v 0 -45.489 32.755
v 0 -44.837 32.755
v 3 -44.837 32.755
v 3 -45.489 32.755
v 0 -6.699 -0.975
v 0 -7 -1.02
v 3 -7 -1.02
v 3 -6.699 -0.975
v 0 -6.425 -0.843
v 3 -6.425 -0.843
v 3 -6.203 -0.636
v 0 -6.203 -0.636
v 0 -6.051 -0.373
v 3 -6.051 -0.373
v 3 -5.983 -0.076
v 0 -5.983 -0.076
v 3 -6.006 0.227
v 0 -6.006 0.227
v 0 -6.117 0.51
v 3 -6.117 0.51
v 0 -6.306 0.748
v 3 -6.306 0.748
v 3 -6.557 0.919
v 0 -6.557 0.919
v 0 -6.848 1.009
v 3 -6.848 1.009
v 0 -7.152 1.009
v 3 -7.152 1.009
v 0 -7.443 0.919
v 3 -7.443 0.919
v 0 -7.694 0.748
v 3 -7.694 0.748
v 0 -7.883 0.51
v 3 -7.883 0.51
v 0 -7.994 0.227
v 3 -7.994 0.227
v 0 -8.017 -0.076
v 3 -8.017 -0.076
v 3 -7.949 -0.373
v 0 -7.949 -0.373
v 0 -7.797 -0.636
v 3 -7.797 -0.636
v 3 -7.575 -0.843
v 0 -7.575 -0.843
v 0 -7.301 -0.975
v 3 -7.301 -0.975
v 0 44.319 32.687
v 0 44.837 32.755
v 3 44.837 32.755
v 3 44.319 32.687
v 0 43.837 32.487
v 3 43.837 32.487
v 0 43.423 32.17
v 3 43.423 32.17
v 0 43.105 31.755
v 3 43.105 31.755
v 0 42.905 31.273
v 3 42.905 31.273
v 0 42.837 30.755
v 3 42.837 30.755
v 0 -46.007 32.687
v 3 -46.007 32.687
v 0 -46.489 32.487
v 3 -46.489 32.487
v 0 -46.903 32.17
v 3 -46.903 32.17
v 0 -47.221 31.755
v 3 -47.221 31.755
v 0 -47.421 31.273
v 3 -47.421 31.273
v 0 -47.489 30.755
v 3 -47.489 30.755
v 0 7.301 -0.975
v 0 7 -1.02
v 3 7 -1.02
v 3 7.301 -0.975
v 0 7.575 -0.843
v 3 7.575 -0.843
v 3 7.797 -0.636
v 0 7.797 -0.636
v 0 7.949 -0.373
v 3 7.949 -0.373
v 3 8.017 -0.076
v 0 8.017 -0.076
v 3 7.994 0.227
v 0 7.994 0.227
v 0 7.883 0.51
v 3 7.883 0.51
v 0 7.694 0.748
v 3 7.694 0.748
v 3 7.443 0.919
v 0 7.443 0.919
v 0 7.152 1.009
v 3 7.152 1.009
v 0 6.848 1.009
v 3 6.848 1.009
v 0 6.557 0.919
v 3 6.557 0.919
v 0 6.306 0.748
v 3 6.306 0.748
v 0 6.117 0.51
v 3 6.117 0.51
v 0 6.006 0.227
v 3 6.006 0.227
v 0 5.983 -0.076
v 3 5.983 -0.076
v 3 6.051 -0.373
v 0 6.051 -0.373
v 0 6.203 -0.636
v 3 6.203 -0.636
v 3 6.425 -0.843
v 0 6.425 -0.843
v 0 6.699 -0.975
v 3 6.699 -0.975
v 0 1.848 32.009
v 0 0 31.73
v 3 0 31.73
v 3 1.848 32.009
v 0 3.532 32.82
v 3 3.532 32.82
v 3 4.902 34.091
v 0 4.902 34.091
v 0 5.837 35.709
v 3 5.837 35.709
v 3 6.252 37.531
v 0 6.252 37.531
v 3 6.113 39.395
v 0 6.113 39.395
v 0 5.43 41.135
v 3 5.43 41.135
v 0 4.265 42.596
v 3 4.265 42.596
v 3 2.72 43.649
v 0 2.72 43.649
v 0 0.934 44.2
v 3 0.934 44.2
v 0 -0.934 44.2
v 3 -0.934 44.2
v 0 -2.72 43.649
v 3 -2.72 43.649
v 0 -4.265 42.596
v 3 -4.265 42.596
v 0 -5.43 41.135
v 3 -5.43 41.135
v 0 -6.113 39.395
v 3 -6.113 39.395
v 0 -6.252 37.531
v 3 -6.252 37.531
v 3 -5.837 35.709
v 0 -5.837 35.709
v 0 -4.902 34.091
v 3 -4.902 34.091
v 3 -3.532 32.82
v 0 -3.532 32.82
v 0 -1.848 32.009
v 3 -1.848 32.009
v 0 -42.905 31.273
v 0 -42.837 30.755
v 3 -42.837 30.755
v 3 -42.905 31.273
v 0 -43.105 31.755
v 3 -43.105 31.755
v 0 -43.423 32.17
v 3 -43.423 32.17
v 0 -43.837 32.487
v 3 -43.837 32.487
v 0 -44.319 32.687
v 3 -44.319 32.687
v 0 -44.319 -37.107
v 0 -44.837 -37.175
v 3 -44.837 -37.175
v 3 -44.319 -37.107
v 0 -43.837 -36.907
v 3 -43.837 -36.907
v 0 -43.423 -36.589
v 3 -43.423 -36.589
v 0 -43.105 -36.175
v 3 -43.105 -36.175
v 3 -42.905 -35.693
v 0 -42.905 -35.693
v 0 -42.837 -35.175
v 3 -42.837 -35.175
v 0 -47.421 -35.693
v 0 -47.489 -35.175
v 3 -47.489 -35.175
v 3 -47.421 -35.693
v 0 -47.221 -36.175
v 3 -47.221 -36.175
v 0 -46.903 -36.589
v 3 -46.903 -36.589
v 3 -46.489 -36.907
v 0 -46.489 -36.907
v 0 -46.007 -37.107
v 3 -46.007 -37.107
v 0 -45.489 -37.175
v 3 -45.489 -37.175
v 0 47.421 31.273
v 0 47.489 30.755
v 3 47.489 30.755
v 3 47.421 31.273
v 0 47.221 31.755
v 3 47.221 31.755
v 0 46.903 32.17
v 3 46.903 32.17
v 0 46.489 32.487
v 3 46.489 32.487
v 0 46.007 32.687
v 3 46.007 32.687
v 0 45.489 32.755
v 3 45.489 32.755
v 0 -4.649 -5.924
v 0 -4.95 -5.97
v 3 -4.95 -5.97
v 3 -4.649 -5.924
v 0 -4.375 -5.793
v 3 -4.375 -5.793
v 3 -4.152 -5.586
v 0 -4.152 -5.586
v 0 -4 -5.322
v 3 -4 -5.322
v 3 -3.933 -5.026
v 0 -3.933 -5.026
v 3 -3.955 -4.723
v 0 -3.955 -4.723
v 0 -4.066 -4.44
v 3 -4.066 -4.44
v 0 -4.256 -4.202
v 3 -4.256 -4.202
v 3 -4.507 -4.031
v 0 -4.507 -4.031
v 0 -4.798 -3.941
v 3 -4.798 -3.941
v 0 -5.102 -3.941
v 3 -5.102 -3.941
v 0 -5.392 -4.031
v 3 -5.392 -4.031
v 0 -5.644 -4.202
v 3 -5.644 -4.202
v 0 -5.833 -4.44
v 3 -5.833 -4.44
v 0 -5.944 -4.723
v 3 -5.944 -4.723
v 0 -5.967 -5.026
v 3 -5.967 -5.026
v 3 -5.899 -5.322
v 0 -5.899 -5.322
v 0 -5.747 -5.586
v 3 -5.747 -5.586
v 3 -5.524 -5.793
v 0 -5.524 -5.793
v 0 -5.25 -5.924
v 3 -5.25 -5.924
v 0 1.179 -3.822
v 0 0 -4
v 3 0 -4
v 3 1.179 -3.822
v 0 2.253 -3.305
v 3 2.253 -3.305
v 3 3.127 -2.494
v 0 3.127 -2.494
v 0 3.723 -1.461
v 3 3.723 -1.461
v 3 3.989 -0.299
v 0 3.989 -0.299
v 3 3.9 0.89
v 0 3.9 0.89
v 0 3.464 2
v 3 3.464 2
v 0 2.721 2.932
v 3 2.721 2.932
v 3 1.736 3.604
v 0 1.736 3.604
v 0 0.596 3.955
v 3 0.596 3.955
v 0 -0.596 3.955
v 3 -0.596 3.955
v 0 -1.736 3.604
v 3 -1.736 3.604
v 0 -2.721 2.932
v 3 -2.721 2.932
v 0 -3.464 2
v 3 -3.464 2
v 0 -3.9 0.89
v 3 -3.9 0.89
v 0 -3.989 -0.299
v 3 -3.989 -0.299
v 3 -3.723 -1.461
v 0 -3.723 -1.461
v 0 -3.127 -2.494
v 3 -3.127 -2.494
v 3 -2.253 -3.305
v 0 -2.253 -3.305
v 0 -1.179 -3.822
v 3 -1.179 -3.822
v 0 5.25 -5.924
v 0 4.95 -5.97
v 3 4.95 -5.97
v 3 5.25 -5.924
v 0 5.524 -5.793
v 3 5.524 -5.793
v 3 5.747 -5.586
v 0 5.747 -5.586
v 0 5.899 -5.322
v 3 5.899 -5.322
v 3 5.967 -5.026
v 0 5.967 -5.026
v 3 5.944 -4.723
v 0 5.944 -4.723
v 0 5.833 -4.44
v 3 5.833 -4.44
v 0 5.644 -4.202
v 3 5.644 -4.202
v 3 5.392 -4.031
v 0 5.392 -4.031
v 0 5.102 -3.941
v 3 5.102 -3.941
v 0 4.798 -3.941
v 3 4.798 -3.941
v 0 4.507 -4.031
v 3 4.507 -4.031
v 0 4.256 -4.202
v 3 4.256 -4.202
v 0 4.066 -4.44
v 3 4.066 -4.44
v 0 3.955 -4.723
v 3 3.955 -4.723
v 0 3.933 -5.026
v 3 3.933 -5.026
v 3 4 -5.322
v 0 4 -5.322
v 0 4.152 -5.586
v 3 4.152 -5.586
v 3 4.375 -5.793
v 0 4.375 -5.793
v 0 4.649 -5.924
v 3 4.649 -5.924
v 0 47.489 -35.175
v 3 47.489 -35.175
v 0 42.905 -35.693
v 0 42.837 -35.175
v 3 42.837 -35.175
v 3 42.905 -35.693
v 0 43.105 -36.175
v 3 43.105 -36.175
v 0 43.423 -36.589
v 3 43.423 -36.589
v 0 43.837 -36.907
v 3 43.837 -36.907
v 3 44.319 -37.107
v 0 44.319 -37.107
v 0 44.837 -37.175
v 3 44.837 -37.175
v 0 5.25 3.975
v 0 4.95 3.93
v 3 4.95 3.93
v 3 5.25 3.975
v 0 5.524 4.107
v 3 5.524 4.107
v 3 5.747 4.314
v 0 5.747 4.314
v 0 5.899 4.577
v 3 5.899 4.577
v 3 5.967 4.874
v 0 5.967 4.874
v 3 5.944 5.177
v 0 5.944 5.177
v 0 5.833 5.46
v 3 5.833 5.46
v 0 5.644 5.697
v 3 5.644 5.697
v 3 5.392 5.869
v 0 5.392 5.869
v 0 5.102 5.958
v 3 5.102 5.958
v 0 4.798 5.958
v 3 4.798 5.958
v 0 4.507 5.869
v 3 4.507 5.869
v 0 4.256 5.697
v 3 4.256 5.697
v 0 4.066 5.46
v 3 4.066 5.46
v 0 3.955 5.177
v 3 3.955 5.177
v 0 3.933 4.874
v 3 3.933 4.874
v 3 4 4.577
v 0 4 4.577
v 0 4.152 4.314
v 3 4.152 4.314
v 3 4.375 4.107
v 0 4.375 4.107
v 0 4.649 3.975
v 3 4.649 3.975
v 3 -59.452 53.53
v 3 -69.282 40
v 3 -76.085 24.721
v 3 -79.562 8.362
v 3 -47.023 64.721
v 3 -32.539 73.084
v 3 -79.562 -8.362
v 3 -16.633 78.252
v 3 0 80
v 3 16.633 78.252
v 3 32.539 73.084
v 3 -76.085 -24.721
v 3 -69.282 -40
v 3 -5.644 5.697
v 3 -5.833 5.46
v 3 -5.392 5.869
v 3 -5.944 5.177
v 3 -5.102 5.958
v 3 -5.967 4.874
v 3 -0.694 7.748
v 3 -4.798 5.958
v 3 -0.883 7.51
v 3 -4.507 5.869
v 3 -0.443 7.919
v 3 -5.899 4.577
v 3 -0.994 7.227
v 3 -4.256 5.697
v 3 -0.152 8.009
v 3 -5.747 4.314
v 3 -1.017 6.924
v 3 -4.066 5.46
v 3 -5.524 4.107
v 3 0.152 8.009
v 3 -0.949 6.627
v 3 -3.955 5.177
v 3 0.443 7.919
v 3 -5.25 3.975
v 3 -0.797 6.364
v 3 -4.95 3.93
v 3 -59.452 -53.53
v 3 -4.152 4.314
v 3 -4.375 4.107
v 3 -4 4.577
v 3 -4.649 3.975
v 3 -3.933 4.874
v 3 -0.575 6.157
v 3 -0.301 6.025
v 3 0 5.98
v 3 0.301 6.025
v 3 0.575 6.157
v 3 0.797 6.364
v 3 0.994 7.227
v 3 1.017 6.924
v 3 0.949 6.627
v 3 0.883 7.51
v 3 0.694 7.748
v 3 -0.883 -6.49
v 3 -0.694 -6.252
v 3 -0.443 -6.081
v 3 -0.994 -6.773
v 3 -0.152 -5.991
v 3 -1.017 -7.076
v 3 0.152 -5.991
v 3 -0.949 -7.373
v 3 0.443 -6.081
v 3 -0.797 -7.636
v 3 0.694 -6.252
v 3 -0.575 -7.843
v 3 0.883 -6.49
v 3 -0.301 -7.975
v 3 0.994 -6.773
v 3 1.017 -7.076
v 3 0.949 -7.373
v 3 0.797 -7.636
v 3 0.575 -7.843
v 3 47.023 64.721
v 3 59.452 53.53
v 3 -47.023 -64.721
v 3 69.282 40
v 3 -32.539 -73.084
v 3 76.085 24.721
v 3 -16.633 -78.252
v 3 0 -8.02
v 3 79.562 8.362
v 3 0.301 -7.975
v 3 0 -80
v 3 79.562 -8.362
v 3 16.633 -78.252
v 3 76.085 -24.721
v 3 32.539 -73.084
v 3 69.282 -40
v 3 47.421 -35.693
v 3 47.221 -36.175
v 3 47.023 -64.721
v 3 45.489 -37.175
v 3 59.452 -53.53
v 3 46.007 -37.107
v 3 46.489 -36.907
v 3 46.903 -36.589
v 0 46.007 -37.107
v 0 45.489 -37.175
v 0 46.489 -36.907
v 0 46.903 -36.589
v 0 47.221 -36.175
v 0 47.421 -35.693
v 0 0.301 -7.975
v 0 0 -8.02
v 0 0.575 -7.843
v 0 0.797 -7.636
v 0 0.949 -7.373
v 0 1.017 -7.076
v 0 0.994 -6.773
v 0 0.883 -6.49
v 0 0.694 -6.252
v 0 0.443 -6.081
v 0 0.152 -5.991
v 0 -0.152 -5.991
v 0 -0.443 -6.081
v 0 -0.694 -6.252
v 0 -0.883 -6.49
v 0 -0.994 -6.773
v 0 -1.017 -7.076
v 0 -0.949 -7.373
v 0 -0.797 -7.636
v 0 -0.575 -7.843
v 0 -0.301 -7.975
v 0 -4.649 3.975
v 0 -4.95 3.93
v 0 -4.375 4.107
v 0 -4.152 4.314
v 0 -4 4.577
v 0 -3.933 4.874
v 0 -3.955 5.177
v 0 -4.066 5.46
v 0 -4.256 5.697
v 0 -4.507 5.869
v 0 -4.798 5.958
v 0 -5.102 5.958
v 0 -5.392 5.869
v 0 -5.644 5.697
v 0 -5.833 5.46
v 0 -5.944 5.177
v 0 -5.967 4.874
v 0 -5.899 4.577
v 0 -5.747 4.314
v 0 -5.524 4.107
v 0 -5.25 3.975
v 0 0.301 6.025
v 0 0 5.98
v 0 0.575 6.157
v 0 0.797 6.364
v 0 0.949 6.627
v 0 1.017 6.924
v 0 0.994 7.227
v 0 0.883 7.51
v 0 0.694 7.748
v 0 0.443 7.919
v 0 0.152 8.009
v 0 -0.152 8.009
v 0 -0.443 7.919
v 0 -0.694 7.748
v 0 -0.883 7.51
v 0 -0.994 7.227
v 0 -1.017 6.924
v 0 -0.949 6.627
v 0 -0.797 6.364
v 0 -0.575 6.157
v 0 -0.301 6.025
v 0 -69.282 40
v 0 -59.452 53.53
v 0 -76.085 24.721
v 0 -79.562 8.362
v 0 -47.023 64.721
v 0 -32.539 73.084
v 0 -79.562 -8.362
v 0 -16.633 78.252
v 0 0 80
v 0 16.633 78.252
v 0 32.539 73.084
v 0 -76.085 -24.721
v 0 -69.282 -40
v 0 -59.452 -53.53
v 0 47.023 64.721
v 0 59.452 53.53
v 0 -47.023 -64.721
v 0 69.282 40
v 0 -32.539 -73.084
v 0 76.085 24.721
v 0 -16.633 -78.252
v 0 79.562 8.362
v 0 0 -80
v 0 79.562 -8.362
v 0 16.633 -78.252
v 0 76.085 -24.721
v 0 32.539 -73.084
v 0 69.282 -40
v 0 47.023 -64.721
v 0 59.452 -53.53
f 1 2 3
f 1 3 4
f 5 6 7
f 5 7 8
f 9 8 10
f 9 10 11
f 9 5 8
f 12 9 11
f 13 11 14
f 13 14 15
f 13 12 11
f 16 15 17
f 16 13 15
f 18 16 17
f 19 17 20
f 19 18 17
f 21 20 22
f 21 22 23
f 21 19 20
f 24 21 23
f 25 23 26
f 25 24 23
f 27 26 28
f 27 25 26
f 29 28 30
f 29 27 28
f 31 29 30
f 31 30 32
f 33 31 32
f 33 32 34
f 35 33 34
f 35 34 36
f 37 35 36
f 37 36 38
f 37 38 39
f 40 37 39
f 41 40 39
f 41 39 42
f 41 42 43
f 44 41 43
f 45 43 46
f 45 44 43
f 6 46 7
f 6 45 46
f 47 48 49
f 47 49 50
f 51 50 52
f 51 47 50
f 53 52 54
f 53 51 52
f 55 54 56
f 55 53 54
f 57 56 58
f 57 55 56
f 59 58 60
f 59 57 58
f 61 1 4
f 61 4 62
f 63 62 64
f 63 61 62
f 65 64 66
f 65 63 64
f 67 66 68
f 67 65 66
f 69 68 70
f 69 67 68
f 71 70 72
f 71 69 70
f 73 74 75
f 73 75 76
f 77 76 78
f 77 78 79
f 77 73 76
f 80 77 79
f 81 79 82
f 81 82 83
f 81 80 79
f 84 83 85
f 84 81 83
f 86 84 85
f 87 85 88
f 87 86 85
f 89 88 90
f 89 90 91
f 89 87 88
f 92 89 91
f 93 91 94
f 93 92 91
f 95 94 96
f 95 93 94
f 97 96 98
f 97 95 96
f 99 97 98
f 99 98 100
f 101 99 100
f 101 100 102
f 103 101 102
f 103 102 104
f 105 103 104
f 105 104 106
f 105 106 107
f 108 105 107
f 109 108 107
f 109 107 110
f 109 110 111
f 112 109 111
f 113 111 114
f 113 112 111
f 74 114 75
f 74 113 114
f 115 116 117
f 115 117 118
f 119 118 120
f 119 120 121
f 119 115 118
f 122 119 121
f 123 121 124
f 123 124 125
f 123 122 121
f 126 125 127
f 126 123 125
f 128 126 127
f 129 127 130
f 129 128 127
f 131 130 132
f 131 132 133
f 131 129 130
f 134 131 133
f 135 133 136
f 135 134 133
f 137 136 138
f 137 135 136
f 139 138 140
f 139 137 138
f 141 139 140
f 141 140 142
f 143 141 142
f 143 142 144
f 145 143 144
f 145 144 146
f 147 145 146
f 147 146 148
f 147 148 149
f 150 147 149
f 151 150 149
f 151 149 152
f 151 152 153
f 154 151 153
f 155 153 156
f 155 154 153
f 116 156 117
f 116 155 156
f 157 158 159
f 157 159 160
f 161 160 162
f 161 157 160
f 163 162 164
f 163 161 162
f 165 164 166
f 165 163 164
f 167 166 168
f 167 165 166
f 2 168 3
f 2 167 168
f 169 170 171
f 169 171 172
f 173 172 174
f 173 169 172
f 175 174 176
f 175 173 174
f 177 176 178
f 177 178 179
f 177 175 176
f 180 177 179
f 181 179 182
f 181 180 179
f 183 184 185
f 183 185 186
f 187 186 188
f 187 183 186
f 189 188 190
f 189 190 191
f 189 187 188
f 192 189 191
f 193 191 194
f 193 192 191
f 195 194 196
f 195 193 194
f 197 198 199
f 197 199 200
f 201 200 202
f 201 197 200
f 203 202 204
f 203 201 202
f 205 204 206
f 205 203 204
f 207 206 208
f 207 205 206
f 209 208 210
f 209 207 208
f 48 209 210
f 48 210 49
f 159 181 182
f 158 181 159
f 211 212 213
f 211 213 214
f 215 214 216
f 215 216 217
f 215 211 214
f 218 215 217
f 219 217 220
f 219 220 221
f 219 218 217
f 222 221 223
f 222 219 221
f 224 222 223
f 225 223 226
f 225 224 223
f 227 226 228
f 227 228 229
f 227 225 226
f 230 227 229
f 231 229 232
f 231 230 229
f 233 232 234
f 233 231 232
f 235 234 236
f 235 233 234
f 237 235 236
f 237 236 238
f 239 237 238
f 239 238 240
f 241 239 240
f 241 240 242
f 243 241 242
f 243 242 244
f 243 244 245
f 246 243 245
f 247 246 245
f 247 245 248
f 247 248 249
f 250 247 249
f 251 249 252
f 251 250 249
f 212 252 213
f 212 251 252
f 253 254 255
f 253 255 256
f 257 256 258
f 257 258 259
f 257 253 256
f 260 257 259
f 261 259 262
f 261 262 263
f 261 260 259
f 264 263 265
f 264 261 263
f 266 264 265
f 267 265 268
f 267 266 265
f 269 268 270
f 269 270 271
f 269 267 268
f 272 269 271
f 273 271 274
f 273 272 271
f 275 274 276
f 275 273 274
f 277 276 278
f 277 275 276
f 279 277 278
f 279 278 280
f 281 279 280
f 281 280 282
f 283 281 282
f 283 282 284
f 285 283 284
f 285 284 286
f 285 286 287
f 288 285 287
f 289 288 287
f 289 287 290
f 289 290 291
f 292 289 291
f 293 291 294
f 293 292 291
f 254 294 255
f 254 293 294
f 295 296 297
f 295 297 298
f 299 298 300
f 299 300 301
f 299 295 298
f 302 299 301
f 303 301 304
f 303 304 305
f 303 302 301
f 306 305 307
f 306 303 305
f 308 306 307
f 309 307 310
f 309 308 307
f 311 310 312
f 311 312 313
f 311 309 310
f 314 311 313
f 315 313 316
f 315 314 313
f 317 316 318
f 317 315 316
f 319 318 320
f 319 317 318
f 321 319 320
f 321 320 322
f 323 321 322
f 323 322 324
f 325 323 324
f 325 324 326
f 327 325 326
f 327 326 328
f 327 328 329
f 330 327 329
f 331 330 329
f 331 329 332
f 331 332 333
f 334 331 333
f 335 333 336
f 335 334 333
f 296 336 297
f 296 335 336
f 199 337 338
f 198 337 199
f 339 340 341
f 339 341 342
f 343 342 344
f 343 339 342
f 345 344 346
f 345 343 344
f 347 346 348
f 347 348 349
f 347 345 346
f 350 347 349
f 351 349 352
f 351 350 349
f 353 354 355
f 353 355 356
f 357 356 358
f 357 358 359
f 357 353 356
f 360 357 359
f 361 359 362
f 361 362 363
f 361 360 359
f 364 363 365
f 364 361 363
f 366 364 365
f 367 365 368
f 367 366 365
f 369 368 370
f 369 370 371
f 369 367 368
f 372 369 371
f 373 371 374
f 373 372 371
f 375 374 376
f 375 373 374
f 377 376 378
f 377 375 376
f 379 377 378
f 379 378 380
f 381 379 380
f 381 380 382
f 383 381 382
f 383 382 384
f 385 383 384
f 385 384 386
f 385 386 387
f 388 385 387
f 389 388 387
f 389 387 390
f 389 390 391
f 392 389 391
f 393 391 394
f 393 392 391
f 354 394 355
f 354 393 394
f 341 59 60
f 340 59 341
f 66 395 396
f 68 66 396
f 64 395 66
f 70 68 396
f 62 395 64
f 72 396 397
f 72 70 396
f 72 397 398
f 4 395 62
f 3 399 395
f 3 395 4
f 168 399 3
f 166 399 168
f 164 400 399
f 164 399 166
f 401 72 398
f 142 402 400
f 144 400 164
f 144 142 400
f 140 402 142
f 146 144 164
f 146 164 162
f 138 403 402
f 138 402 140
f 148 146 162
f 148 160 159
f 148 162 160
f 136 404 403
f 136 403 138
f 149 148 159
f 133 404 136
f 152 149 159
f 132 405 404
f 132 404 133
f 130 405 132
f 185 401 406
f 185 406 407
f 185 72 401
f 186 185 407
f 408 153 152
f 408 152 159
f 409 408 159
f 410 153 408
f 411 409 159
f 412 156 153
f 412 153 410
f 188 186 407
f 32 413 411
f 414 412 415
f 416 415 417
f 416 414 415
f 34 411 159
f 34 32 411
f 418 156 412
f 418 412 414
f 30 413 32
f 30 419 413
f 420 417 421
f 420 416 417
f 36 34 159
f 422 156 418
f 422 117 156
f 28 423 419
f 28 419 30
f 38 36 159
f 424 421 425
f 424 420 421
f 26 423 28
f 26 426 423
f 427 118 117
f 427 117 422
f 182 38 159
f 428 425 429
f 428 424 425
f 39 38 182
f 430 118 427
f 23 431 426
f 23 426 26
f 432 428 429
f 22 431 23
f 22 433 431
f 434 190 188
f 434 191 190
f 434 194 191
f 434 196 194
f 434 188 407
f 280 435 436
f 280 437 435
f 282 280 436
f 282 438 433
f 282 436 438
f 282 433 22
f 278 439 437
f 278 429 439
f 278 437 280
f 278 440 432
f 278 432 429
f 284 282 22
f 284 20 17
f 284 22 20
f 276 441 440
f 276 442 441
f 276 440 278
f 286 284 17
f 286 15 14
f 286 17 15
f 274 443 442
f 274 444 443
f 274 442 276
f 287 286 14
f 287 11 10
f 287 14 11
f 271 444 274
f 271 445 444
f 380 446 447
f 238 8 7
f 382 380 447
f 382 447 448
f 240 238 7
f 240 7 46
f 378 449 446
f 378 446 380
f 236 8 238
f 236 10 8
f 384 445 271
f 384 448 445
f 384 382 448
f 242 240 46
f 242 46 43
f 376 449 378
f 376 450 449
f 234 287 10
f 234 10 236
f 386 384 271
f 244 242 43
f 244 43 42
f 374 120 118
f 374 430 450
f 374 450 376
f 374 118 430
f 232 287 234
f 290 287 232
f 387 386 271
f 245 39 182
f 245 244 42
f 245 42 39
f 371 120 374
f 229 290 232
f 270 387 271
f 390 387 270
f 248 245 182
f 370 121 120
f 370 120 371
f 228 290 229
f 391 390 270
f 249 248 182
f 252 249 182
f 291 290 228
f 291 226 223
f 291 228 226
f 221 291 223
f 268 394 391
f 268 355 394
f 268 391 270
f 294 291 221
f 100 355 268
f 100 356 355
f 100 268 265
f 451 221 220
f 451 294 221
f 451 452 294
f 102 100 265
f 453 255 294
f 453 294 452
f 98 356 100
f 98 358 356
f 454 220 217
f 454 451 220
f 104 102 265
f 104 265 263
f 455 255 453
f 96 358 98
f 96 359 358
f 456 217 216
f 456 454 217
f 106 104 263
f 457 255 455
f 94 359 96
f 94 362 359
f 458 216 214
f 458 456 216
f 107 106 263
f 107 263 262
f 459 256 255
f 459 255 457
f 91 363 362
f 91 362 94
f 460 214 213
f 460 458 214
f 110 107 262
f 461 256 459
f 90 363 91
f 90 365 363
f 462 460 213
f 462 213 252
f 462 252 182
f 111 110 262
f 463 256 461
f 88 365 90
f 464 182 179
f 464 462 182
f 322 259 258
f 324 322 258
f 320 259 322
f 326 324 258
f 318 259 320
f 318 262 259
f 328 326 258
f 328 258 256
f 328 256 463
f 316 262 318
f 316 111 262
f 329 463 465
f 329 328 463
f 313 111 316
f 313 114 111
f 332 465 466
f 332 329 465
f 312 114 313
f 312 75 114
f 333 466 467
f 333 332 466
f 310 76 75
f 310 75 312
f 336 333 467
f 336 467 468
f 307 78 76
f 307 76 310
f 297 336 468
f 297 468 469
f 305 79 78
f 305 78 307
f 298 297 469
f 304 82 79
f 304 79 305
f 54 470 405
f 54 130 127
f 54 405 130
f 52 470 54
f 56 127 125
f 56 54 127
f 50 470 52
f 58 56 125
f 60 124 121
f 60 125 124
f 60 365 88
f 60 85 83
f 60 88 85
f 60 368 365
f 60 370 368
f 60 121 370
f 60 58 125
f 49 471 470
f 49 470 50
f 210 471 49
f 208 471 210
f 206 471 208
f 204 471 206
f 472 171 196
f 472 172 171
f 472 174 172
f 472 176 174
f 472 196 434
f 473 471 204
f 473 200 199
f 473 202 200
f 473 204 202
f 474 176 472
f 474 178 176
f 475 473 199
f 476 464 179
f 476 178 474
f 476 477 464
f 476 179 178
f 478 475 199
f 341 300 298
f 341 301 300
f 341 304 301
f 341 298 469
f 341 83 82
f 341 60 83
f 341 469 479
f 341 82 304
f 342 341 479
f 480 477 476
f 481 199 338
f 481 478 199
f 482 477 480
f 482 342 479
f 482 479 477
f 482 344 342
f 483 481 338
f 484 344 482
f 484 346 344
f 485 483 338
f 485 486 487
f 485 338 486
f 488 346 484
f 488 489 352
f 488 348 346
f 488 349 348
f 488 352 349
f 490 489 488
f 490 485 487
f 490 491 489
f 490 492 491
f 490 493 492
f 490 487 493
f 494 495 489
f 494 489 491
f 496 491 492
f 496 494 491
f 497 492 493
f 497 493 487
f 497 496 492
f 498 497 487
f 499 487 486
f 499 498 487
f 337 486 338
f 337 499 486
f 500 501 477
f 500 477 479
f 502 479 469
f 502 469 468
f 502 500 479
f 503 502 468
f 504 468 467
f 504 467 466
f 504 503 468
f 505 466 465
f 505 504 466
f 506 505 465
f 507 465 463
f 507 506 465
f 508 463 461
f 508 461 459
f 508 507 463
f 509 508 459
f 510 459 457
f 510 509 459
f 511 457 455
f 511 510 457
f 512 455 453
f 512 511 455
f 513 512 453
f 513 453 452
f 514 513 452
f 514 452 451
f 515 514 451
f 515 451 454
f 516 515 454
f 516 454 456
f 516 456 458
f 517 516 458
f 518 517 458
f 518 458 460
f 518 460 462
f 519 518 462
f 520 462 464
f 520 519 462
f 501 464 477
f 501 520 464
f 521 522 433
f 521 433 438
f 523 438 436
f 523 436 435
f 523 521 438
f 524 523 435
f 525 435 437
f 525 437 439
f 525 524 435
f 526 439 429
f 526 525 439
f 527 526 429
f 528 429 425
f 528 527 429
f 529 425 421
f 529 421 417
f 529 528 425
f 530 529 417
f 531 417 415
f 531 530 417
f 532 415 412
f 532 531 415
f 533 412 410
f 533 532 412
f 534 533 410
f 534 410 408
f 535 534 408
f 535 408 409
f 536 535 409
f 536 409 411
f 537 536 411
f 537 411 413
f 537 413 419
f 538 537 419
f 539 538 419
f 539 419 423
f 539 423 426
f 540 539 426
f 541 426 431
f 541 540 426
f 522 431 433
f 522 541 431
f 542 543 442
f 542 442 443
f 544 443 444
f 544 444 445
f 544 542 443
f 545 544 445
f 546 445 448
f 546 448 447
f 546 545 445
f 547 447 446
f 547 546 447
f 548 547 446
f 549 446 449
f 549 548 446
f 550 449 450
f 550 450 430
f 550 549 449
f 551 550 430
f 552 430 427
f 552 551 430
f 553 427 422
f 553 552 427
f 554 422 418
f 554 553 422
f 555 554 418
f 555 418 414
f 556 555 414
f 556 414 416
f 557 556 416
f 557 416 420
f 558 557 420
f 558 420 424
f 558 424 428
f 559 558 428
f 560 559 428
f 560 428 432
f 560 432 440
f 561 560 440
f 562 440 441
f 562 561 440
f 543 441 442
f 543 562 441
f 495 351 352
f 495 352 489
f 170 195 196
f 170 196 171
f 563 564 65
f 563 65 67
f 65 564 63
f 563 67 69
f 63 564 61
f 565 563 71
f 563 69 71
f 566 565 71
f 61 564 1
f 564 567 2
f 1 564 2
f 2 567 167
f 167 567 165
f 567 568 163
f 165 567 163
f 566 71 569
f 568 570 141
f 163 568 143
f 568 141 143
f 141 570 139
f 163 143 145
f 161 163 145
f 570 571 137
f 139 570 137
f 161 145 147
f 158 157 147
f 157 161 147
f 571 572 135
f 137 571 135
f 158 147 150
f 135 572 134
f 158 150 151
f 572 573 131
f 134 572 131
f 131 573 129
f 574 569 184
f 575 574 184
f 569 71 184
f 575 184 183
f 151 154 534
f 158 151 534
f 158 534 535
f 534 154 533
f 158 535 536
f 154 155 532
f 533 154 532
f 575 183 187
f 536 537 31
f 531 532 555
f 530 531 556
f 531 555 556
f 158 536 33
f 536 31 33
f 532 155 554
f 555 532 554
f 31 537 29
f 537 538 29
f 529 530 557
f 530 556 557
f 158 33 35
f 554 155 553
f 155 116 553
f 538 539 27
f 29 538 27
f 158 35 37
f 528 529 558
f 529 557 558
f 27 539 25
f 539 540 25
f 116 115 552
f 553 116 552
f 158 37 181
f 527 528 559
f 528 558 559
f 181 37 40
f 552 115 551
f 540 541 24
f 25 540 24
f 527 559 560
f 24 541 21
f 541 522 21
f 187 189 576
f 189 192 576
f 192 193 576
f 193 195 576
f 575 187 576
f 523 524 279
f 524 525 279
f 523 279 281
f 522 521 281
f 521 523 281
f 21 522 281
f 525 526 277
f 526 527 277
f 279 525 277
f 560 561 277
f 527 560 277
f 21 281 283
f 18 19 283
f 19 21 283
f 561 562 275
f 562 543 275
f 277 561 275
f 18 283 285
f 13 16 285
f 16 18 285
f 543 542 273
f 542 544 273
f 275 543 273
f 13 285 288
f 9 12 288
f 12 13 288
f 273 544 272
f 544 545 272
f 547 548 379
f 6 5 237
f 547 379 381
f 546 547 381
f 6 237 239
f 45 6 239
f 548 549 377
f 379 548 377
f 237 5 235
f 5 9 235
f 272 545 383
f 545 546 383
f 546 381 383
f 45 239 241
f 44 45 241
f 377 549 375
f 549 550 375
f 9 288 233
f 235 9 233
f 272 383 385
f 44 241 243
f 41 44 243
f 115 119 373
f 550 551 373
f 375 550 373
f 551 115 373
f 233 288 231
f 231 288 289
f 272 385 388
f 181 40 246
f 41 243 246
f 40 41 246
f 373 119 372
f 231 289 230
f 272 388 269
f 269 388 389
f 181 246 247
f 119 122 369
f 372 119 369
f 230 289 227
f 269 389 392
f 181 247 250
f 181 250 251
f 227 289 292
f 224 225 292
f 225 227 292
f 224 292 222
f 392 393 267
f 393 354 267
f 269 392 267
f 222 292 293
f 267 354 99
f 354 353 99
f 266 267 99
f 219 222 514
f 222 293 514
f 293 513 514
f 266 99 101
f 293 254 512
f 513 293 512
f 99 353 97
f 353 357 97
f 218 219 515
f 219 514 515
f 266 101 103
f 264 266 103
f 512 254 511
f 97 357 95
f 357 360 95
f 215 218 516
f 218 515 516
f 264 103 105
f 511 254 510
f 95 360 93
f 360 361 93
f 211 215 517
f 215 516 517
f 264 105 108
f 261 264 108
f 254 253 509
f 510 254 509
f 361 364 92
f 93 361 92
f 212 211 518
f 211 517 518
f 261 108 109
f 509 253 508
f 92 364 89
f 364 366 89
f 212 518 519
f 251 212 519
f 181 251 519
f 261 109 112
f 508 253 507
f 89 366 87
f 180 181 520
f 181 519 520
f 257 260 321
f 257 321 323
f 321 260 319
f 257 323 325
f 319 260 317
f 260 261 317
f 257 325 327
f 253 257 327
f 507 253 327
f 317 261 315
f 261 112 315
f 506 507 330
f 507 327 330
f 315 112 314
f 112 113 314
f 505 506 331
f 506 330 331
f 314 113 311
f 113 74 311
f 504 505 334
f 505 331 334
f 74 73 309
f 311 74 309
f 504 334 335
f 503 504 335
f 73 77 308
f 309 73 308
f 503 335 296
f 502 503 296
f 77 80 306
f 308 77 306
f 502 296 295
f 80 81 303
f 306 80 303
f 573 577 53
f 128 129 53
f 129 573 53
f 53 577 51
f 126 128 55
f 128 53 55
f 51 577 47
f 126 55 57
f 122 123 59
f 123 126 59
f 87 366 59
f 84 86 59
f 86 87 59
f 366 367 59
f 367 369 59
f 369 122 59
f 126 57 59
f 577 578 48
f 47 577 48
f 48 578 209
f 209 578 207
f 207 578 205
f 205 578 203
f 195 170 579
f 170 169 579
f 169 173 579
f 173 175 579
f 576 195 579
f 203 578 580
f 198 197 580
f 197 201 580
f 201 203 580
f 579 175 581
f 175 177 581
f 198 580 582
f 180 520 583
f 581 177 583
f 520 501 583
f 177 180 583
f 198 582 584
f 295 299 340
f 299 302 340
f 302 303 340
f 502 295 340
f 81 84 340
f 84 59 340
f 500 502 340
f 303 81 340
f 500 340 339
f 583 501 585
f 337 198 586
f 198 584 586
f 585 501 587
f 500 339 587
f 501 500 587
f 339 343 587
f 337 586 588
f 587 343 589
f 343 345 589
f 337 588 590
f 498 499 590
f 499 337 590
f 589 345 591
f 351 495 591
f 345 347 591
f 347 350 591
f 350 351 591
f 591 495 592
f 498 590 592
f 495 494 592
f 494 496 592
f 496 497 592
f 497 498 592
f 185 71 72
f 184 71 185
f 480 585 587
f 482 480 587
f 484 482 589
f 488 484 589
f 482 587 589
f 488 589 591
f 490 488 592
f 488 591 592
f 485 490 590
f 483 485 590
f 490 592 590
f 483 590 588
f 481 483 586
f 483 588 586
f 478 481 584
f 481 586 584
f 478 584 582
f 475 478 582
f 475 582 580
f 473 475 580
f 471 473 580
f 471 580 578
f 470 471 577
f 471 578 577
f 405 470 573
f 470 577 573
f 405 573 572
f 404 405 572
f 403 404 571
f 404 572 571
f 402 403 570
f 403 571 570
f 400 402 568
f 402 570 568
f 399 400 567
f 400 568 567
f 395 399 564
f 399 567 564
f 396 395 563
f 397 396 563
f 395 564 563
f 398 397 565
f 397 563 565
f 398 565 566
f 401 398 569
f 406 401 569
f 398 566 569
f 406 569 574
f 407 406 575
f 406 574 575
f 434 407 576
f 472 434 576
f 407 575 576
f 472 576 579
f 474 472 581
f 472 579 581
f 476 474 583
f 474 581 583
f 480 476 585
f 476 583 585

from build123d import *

# Parameters (mm, degrees)
SKETCH_1_R      = 80
SKETCH_1_R_2    = 4
SKETCH_1_R_3    = 1.02
SKETCH_1_R_4    = 6.269952148
EXTRUDE_1_DEPTH = 3


with BuildPart() as part:
    # ｽｹｯﾁ1 → ﾎﾞｽ - 押し出し1 (new body)
    with BuildSketch(Plane(origin=(0, 0, 0), x_dir=(0, 0, -1), z_dir=(1, 0, 0))):
        Circle(SKETCH_1_R)
        Circle(SKETCH_1_R_2, mode=Mode.SUBTRACT)
        with Locations((4.949747468, 4.949747468)):
            Circle(SKETCH_1_R_3, mode=Mode.SUBTRACT)
        with Locations((7, 0)):
            Circle(SKETCH_1_R_3, mode=Mode.SUBTRACT)
        with Locations((4.949747468, -4.949747468)):
            Circle(SKETCH_1_R_3, mode=Mode.SUBTRACT)
        with Locations((0, -7)):
            Circle(SKETCH_1_R_3, mode=Mode.SUBTRACT)
        with Locations((-4.949747468, -4.949747468)):
            Circle(SKETCH_1_R_3, mode=Mode.SUBTRACT)
        with Locations((-7, 0)):
            Circle(SKETCH_1_R_3, mode=Mode.SUBTRACT)
        with Locations((-4.949747468, 4.949747468)):
            Circle(SKETCH_1_R_3, mode=Mode.SUBTRACT)
        with Locations((0, 7)):
            Circle(SKETCH_1_R_3, mode=Mode.SUBTRACT)
        with Locations((-38, 0)):
            Circle(SKETCH_1_R_4, mode=Mode.SUBTRACT)
        with BuildLine():
            Line((-30.755353243, 42.837057437), (35.175005572, 42.837057437))
            ThreePointArc((35.175005572, 42.837057437), (36.589219135, 43.422843874), (37.175005572, 44.837057437))
            Line((37.175005572, 44.837057437), (37.175005572, 45.489077015))
            ThreePointArc((37.175005572, 45.489077015), (36.589219135, 46.903290577), (35.175005572, 47.489077015))
            Line((35.175005572, 47.489077015), (-30.755353243, 47.489077015))
            ThreePointArc((-30.755353243, 47.489077015), (-32.169566806, 46.903290577), (-32.755353243, 45.489077015))
            Line((-32.755353243, 45.489077015), (-32.755353243, 44.837057437))
            ThreePointArc((-32.755353243, 44.837057437), (-32.169566806, 43.422843874), (-30.755353243, 42.837057437))
        make_face(mode=Mode.SUBTRACT)
        with BuildLine():
            Line((37.175005572, -45.489077015), (37.175005572, -44.837057437))
            ThreePointArc((37.175005572, -44.837057437), (36.589219135, -43.422843874), (35.175005572, -42.837057437))
            Line((35.175005572, -42.837057437), (-30.755353243, -42.837057437))
            ThreePointArc((-30.755353243, -42.837057437), (-32.169566806, -43.422843874), (-32.755353243, -44.837057437))
            Line((-32.755353243, -44.837057437), (-32.755353243, -45.489077015))
            ThreePointArc((-32.755353243, -45.489077015), (-32.169566806, -46.903290577), (-30.755353243, -47.489077015))
            Line((-30.755353243, -47.489077015), (35.175005572, -47.489077015))
            ThreePointArc((35.175005572, -47.489077015), (36.589219135, -46.903290577), (37.175005572, -45.489077015))
        make_face(mode=Mode.SUBTRACT)
    extrude(amount=EXTRUDE_1_DEPTH)


solid = part.part
